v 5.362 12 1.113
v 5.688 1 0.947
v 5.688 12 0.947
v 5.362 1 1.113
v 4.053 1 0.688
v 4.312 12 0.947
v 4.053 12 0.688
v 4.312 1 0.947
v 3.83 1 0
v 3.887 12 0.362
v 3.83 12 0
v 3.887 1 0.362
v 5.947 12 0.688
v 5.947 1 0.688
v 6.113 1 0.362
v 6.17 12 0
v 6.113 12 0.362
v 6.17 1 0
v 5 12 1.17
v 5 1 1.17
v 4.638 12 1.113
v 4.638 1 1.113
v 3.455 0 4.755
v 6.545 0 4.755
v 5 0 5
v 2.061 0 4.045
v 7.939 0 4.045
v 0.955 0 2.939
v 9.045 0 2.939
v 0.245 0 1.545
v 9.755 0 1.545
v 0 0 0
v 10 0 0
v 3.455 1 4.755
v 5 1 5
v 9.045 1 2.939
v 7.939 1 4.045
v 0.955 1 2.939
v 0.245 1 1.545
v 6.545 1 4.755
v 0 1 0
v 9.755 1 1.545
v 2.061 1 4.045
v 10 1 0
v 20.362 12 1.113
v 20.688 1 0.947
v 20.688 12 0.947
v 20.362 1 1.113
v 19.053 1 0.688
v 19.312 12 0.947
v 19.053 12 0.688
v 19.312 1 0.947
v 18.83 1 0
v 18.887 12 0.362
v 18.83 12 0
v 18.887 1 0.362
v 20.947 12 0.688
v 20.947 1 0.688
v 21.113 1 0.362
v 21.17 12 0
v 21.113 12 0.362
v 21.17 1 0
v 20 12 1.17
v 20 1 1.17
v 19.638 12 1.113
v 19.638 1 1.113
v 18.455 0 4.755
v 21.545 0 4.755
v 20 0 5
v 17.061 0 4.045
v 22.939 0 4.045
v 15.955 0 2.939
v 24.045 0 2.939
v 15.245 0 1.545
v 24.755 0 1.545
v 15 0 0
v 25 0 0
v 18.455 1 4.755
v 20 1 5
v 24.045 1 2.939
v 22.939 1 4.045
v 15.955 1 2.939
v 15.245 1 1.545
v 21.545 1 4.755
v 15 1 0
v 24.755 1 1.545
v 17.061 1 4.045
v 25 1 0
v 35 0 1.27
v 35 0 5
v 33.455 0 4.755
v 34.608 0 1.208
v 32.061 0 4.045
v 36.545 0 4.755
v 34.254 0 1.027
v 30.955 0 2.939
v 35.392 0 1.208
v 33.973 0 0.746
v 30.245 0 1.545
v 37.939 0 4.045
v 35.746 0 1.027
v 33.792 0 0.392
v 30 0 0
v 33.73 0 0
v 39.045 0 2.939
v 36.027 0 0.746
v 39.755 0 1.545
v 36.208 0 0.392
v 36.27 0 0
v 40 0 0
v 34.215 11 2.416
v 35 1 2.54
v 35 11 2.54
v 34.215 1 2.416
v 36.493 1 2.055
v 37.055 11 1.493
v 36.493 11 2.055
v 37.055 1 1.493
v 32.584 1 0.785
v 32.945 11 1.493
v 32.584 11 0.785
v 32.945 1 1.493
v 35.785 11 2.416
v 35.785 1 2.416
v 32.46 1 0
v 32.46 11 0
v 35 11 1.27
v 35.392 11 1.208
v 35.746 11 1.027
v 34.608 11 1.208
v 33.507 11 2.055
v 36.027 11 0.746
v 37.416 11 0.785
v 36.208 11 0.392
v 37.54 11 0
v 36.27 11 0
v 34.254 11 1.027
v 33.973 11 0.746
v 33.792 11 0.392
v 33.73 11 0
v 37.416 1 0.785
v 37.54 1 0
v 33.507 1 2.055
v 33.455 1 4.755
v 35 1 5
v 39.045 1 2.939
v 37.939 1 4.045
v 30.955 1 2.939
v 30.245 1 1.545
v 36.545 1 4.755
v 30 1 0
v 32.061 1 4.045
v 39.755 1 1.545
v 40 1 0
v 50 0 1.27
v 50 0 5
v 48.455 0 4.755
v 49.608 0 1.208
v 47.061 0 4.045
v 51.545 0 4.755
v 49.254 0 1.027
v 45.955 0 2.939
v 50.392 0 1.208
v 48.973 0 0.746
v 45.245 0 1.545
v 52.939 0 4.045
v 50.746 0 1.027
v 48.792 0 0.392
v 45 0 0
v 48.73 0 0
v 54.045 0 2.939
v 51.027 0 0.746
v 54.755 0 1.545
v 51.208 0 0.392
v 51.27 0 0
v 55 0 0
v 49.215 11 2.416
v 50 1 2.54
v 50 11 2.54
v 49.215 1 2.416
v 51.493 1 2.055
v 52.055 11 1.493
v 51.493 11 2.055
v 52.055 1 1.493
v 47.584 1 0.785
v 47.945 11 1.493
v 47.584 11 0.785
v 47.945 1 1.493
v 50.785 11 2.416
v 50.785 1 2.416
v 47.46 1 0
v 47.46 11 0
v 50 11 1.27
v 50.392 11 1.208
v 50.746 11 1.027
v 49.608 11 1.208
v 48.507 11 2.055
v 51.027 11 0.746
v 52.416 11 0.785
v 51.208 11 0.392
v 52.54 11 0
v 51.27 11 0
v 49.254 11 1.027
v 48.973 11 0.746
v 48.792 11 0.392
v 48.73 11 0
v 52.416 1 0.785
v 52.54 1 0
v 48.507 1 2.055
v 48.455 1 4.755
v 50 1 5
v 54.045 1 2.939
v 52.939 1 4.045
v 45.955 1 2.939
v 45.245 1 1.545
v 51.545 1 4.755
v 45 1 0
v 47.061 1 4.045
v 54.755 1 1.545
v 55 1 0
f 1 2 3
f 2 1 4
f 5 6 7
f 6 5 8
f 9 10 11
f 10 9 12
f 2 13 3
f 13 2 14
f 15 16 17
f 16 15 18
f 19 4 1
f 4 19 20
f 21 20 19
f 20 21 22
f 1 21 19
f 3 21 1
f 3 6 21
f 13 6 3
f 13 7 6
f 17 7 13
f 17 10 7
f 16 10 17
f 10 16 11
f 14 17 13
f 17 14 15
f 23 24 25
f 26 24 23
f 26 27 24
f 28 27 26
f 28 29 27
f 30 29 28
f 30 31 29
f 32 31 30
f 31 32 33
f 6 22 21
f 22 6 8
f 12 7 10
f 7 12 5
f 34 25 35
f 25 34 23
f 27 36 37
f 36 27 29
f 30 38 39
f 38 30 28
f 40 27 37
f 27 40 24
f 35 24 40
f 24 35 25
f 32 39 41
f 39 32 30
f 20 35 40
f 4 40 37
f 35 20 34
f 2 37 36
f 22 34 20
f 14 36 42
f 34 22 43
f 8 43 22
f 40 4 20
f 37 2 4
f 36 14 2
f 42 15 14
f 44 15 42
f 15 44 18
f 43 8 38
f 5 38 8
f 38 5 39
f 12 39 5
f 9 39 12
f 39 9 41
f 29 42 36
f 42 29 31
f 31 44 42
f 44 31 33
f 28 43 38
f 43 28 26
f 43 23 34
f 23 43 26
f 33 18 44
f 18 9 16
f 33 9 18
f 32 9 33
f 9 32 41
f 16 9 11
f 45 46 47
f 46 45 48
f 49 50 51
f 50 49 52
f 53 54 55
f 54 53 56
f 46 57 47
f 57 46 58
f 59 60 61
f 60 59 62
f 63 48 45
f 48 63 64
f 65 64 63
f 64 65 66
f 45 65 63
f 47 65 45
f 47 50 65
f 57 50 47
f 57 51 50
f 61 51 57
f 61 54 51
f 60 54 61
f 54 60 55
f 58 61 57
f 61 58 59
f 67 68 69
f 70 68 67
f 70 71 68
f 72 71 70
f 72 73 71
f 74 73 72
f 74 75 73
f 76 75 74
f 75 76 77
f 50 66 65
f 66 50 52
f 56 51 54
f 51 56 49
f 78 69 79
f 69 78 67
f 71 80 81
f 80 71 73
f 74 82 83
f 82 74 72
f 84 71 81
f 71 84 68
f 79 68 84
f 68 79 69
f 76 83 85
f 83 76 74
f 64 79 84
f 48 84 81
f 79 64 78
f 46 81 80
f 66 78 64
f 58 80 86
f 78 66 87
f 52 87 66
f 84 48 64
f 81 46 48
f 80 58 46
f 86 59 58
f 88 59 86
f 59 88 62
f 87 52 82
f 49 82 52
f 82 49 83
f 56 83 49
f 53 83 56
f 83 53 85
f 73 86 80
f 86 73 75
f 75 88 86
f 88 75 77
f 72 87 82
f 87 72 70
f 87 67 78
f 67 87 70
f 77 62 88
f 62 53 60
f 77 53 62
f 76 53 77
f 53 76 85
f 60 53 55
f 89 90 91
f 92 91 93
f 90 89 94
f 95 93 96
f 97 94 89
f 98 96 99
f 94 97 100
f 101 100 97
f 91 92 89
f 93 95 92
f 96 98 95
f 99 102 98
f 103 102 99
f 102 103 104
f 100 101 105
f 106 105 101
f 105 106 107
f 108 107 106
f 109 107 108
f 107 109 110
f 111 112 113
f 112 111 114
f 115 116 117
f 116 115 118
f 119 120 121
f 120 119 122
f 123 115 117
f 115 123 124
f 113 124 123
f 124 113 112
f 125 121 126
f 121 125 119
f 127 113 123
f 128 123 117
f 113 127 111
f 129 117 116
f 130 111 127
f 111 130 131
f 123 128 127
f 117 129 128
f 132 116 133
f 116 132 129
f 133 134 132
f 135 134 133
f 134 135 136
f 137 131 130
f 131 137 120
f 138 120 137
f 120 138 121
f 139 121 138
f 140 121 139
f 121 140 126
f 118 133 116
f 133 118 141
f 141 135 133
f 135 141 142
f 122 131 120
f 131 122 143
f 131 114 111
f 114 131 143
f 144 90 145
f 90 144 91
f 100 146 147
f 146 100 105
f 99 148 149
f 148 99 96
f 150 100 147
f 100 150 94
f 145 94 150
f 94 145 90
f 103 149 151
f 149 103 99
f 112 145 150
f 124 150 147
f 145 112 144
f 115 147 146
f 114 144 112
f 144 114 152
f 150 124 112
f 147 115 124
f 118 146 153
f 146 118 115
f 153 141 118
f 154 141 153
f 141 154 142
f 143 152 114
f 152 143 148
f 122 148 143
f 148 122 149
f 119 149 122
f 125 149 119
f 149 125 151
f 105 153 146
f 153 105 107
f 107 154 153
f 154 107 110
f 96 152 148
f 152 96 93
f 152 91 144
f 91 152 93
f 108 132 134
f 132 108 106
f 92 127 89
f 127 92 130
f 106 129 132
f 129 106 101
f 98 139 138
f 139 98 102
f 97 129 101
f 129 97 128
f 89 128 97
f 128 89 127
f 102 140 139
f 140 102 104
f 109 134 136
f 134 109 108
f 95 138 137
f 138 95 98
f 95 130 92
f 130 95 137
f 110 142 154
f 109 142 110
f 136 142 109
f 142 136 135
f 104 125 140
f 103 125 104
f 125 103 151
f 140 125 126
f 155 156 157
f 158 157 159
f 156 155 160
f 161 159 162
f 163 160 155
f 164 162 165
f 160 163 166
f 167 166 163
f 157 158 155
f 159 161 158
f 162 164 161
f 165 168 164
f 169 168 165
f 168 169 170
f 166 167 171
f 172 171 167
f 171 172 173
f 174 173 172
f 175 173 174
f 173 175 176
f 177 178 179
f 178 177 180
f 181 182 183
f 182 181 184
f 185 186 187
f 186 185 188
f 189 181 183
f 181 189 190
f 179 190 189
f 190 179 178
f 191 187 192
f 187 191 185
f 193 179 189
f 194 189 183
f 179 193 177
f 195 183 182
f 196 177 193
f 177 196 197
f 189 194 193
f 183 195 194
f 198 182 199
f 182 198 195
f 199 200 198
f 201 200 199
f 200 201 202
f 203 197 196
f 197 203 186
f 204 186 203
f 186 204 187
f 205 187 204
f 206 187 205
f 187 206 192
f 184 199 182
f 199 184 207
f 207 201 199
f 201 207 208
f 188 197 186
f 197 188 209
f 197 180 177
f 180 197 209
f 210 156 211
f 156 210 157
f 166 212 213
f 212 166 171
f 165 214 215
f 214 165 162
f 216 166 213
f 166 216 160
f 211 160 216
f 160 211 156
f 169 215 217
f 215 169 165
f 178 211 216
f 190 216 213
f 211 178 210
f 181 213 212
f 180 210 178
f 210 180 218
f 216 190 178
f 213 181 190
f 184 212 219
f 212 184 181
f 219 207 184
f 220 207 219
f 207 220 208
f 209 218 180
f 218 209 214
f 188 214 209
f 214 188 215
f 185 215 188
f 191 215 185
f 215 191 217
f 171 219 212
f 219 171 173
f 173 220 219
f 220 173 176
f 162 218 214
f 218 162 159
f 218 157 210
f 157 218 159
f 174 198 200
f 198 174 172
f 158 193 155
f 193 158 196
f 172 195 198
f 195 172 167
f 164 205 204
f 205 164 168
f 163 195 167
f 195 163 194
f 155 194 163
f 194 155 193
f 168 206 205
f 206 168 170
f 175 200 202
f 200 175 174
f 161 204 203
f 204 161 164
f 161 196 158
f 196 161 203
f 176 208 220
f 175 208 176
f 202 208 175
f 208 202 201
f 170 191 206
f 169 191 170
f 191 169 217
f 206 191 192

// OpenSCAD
$fn=20;
HeadHeight=1; // [1,1.5,2,2.5,3]
HeadDiameter=10; //[7:15]
SleeveLength=10; //[1:100]
SleeveOutterDiameter=5.08;//[5.00,5.08,6,7,8,9,10]
Play=0.1;// [0.0,0.1,0.2,0.3,0.4,0.5]

HeadRadius=HeadDiameter/2;
SleeveOutterRadius=SleeveOutterDiameter/2;
SleeveInnerRadius=(SleeveOutterRadius/2)-Play;

O1=HeadDiameter/2;
O2=HeadDiameter+10;
O3=(HeadDiameter*2)+15;
O4=(HeadDiameter*3)+20;

translate([O1,0,0]) core();
translate([O2,0,0]) core();
translate([O3,0,0]) outter();
translate([O4,0,0]) outter();

module core() {
	difference() {
		union() {
			rotate([-90,0,0]) cylinder(r=SleeveInnerRadius,h=SleeveLength+(HeadHeight*2));
			rotate([-90,0,0]) cylinder(r=HeadRadius,h=HeadHeight);
		}
		translate([-HeadRadius,0,-HeadRadius]) cube([HeadDiameter+1,SleeveLength+(HeadHeight*2)+1,HeadRadius]);
	}
}

module outter() {
	difference() {
		union() {
			rotate([-90,0,0]) cylinder(r=SleeveOutterRadius,h=SleeveLength+HeadHeight);
			rotate([-90,0,0]) cylinder(r=HeadRadius,h=HeadHeight);
		}
		rotate([-90,0,0]) cylinder(r=SleeveInnerRadius+Play,h=SleeveLength+HeadHeight);
		translate([-HeadRadius,0,-HeadRadius]) cube([HeadDiameter+1,SleeveLength+HeadHeight+1,HeadRadius]);
	}
}
